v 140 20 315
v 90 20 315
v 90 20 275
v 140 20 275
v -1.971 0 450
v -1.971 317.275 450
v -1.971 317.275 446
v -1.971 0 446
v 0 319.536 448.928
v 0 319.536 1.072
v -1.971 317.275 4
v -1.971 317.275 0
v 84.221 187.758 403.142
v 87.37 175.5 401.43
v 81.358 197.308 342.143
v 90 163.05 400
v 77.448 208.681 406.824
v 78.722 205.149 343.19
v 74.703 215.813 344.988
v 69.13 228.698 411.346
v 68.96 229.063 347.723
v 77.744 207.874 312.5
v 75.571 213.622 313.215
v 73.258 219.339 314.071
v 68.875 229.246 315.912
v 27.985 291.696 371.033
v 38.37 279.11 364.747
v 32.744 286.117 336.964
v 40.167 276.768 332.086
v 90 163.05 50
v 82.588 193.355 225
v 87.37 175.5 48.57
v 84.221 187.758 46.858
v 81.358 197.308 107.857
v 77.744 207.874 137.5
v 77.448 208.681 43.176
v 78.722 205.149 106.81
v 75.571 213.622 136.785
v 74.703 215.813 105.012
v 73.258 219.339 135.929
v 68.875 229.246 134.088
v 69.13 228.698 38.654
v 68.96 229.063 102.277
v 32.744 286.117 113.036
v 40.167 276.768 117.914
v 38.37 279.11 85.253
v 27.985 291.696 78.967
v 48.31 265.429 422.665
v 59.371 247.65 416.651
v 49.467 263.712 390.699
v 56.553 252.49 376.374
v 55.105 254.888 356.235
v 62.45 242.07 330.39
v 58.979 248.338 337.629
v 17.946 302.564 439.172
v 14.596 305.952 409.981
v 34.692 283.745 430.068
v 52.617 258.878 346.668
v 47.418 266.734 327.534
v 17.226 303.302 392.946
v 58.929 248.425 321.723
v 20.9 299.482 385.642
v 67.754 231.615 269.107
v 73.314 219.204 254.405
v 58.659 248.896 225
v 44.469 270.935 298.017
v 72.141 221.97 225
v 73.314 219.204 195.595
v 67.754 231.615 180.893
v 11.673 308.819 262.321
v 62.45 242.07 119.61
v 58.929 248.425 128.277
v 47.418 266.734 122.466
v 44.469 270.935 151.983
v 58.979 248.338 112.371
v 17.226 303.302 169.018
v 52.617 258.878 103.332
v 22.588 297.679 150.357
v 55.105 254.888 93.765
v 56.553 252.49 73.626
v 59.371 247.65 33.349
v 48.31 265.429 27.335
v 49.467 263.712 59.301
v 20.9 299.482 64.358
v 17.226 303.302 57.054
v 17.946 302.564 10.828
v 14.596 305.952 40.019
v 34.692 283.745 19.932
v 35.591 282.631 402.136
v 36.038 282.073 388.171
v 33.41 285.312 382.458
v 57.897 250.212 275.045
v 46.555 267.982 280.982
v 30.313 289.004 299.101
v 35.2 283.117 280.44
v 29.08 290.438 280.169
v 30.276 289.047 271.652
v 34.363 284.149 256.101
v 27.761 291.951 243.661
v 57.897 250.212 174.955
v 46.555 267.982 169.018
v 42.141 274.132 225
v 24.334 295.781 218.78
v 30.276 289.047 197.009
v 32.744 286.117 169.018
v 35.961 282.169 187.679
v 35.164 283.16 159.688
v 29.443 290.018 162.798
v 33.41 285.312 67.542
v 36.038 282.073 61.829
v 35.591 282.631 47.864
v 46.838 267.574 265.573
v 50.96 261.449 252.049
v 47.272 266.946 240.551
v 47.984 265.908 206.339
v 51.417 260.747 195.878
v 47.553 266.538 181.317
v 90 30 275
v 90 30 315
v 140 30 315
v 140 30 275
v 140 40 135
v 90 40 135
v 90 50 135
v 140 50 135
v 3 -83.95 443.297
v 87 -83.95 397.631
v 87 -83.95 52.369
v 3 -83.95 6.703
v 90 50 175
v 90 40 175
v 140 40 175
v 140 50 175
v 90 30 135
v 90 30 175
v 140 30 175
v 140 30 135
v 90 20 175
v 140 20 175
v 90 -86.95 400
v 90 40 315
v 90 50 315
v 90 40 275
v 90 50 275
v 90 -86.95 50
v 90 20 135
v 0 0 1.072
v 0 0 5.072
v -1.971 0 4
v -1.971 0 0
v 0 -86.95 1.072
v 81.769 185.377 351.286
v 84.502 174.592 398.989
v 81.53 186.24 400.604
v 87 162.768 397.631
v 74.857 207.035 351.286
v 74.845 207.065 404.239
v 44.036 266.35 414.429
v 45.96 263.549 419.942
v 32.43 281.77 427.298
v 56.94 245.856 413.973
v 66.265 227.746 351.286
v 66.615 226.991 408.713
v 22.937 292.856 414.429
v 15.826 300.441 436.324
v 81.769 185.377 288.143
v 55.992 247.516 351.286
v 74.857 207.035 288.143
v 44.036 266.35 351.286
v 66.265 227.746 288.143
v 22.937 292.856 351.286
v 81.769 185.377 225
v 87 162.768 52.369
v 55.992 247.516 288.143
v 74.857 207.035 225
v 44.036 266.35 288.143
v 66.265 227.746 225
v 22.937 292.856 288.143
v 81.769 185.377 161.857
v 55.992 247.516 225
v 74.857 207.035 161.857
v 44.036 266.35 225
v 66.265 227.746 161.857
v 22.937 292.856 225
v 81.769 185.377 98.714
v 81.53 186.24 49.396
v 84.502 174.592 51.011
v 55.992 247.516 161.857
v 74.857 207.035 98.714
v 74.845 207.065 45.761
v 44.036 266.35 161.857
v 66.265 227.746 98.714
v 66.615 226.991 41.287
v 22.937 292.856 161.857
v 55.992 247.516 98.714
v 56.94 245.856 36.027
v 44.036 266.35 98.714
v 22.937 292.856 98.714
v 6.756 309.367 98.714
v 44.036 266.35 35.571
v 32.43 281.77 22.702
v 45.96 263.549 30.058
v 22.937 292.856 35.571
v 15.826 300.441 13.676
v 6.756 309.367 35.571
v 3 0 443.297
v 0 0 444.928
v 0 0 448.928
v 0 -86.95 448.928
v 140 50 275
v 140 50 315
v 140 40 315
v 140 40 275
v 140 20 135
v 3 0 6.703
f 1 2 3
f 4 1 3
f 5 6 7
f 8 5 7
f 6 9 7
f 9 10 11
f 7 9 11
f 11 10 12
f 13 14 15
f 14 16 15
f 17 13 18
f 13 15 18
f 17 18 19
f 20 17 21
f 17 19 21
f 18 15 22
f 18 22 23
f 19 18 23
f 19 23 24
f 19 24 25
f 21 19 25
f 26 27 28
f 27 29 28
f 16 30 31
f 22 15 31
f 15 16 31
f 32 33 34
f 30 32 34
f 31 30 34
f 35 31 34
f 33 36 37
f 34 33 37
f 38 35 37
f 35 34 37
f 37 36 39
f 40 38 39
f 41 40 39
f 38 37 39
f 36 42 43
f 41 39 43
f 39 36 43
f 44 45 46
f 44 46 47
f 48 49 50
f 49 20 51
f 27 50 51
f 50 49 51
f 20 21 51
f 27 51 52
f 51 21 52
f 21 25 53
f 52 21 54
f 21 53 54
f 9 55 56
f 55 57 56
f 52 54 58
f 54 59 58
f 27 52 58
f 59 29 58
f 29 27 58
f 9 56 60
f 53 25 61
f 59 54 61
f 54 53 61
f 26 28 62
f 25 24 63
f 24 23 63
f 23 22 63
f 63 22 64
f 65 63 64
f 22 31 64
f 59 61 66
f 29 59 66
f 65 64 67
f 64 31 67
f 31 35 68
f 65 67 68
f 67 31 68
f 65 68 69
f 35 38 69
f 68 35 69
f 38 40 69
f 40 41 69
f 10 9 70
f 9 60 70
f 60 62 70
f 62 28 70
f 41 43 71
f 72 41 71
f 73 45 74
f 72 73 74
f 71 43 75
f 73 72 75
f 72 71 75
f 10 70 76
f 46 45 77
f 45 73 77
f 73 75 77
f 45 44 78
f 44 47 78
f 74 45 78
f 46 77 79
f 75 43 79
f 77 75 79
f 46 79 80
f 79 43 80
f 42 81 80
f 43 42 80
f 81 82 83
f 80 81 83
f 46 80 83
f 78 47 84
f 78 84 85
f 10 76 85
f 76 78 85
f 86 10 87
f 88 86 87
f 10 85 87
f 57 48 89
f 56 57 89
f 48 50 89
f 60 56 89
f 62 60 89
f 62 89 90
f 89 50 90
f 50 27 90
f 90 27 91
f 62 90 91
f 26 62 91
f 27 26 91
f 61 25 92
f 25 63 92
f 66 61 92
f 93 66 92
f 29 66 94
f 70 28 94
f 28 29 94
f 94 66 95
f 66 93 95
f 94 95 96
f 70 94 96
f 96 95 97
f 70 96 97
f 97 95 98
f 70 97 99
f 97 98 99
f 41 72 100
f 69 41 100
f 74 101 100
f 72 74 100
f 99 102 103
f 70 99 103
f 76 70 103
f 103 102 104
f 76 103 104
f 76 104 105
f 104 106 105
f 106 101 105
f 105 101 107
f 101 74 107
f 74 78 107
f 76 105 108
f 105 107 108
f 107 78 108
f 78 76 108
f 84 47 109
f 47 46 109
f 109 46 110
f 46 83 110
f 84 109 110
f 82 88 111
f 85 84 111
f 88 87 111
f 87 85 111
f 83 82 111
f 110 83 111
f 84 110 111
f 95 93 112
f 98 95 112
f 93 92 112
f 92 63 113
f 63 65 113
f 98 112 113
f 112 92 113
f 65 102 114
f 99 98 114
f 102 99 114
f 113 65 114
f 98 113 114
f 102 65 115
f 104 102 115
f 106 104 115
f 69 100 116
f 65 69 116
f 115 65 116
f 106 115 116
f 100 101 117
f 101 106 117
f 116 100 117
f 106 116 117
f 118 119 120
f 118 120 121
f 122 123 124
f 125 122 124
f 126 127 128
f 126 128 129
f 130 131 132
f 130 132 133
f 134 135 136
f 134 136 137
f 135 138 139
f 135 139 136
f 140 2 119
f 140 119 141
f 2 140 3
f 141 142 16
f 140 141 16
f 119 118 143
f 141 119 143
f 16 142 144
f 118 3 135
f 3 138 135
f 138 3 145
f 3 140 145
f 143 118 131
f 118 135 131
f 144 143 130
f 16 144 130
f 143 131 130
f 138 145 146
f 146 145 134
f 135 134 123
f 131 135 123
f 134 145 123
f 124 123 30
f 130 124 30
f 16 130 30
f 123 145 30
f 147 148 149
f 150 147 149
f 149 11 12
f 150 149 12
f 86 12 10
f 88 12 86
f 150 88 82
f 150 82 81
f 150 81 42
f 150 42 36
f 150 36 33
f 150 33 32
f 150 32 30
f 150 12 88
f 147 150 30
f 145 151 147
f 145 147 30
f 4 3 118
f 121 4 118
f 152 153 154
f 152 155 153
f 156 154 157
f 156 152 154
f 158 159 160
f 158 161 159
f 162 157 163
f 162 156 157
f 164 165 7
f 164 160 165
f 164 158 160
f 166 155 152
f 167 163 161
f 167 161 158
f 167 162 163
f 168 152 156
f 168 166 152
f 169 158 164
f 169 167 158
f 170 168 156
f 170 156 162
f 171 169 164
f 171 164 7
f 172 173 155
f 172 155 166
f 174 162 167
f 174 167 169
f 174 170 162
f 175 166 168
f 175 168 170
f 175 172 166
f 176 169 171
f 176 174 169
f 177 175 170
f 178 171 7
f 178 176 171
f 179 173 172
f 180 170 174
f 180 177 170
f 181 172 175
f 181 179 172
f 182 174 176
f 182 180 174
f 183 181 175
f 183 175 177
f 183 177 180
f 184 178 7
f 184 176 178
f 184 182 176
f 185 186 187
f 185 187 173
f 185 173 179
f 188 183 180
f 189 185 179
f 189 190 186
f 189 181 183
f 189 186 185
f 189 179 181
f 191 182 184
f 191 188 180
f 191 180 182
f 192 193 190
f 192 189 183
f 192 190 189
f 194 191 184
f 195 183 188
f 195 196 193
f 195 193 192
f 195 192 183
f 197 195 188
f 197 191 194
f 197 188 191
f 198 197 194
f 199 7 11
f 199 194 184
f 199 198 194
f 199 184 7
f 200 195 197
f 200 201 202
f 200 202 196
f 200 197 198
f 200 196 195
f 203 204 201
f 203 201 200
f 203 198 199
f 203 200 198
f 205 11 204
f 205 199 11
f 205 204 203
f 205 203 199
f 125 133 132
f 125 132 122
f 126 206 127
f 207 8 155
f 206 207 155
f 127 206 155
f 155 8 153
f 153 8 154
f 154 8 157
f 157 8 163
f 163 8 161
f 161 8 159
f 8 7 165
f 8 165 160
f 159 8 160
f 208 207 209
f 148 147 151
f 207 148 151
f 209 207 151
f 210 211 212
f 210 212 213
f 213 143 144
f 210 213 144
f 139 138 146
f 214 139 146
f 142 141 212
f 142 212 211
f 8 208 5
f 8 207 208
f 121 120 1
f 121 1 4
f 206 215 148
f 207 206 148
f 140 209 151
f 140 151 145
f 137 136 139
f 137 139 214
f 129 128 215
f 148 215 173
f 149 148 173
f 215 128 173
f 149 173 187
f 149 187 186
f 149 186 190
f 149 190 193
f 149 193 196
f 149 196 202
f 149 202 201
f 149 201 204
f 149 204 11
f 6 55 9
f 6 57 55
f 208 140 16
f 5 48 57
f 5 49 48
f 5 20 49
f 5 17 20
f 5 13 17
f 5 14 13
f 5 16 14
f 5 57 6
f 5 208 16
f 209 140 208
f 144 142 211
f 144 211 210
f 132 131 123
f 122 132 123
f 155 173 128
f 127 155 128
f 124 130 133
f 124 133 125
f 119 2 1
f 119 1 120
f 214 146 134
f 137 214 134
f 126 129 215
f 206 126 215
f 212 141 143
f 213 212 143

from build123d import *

# Parameters (mm, degrees)
BOSS_EXTRUDE1_DEPTH             = 450
CUT_EXTRUDE1_DEPTH              = 320.536163525
CUT_EXTRUDE1_DEPTH_BACK         = 87.9500001
BOSS_EXTRUDE2_REACH             = 321.536
BOSS_EXTRUDE2_DIRECTION_2_REACH = 88.95
SKETCH4_W                       = 40
SKETCH4_H                       = 10
BOSS_EXTRUDE3_DEPTH             = 50


with BuildPart() as part:
    # Sketch1 → Boss-Extrude1 (new body)
    with BuildSketch(Plane.XY):
        with BuildLine():
            Line((0, 0), (0, -86.95))
            Line((0, -86.95), (90, -86.95))
            Line((90, -86.95), (90, 163.05))
            add(Edge.make_bspline(
                [(90, 163.05), (72.317416943, 256.499426115), (1.7e-06, 319.536163425)],
                knots=[0, 0, 0, 1, 1, 1], degree=2))
            Line((1.7e-06, 319.536163425), (-1.971240178, 317.274702513))
            add(Edge.make_bspline(
                [(87, 162.76796294), (86.63530579, 164.685544789), (85.866737034, 168.522541651), (84.193801862, 176.09415534), (81.838470508, 185.417428941), (78.592614297, 196.364076295), (73.704594381, 210.644362496), (66.544776494, 227.902696365), (56.272326819, 247.671791898), (44.316806262, 266.505130738), (32.948415938, 281.423453125), (23.007866651, 292.89431167), (15.129804099, 301.265055213), (8.209142943, 308.04969842), (2.465529724, 313.357146881), (-0.486511784, 315.980513091), (-1.971240178, 317.274702513)],
                knots=[0.001490309, 0.001490309, 0.001490309, 0.001490309, 0.032693737, 0.063897165, 0.12630402, 0.188710876, 0.251117732, 0.375931443, 0.500745154, 0.625558866, 0.750372577, 0.812779433, 0.875186289, 0.937593144, 0.968796572, 1, 1, 1, 1], degree=3))
            Line((87, 162.76796294), (87, -83.95))
            Line((87, -83.95), (3, -83.95))
            Line((3, -83.95), (3, 0))
            Line((3, 0), (0, 0))
        make_face()
    extrude(amount=BOSS_EXTRUDE1_DEPTH)

    # Sketch2 → Cut-Extrude1 (cut, two sides)
    with BuildSketch(Plane(origin=(0, 0, 0), x_dir=(1, 0, 0), z_dir=(0, 1, 0))) as cut_extrude1_sk:
        Polygon((-1.971240178, -450), (90, -400), (90, -450), align=None)
        Polygon((90, 0), (90, -50), (-1.971240178, 0), align=None)
    extrude(amount=CUT_EXTRUDE1_DEPTH, mode=Mode.SUBTRACT)
    extrude(cut_extrude1_sk.sketch, amount=-CUT_EXTRUDE1_DEPTH_BACK, mode=Mode.SUBTRACT)

    # Sketch3 → Boss-Extrude2 (add, up to next)
    with BuildSketch(Plane(origin=(0, 0, 0), x_dir=(1, 0, 0), z_dir=(0, 1, 0)), mode=Mode.PRIVATE) as boss_extrude2_sk1:
        Polygon((-1.971240178, -446), (90, -396), (90, -400), (-1.971240178, -450), align=None)
    boss_extrude2_tool1 = extrude(boss_extrude2_sk1.sketch, amount=BOSS_EXTRUDE2_REACH, mode=Mode.PRIVATE) - part.part
    add(boss_extrude2_tool1.solids().sort_by_distance((44.01438, 0, 423))[0])
    # Sketch3 → Boss-Extrude2 (add, up to next)
    with BuildSketch(Plane(origin=(0, 0, 0), x_dir=(1, 0, 0), z_dir=(0, 1, 0)), mode=Mode.PRIVATE) as boss_extrude2_sk2:
        Polygon((-1.971240178, -4), (-1.971240178, 0), (90, -50), (90, -54), align=None)
    boss_extrude2_tool2 = extrude(boss_extrude2_sk2.sketch, amount=BOSS_EXTRUDE2_REACH, mode=Mode.PRIVATE) - part.part
    add(boss_extrude2_tool2.solids().sort_by_distance((44.01438, 0, 27))[0])

    # Sketch3 → Boss-Extrude2 direction 2 (add, up to next)
    with BuildSketch(Plane(origin=(0, 0, 0), x_dir=(1, 0, 0), z_dir=(0, 1, 0)), mode=Mode.PRIVATE) as boss_extrude2_direction_2_sk1:
        Polygon((-1.971240178, -446), (90, -396), (90, -400), (-1.971240178, -450), align=None)
    boss_extrude2_direction_2_tool1 = extrude(boss_extrude2_direction_2_sk1.sketch, amount=-BOSS_EXTRUDE2_DIRECTION_2_REACH, mode=Mode.PRIVATE) - part.part
    add(boss_extrude2_direction_2_tool1.solids().sort_by_distance((44.01438, 0, 423))[0])
    # Sketch3 → Boss-Extrude2 direction 2 (add, up to next)
    with BuildSketch(Plane(origin=(0, 0, 0), x_dir=(1, 0, 0), z_dir=(0, 1, 0)), mode=Mode.PRIVATE) as boss_extrude2_direction_2_sk2:
        Polygon((-1.971240178, -4), (-1.971240178, 0), (90, -50), (90, -54), align=None)
    boss_extrude2_direction_2_tool2 = extrude(boss_extrude2_direction_2_sk2.sketch, amount=-BOSS_EXTRUDE2_DIRECTION_2_REACH, mode=Mode.PRIVATE) - part.part
    add(boss_extrude2_direction_2_tool2.solids().sort_by_distance((44.01438, 0, 27))[0])

    # Sketch4 → Boss-Extrude3 (add)
    with BuildSketch(Plane(origin=(90, 0, 0), x_dir=(0, 0, -1), z_dir=(1, 0, 0))):
        with Locations((-295, 25)):
            Rectangle(SKETCH4_W, SKETCH4_H)
        with Locations((-155, 45)):
            Rectangle(SKETCH4_W, SKETCH4_H)
        with Locations((-155, 25)):
            Rectangle(SKETCH4_W, SKETCH4_H)
        with Locations((-295, 45)):
            Rectangle(SKETCH4_W, SKETCH4_H)
    extrude(amount=BOSS_EXTRUDE3_DEPTH)


solid = part.part
